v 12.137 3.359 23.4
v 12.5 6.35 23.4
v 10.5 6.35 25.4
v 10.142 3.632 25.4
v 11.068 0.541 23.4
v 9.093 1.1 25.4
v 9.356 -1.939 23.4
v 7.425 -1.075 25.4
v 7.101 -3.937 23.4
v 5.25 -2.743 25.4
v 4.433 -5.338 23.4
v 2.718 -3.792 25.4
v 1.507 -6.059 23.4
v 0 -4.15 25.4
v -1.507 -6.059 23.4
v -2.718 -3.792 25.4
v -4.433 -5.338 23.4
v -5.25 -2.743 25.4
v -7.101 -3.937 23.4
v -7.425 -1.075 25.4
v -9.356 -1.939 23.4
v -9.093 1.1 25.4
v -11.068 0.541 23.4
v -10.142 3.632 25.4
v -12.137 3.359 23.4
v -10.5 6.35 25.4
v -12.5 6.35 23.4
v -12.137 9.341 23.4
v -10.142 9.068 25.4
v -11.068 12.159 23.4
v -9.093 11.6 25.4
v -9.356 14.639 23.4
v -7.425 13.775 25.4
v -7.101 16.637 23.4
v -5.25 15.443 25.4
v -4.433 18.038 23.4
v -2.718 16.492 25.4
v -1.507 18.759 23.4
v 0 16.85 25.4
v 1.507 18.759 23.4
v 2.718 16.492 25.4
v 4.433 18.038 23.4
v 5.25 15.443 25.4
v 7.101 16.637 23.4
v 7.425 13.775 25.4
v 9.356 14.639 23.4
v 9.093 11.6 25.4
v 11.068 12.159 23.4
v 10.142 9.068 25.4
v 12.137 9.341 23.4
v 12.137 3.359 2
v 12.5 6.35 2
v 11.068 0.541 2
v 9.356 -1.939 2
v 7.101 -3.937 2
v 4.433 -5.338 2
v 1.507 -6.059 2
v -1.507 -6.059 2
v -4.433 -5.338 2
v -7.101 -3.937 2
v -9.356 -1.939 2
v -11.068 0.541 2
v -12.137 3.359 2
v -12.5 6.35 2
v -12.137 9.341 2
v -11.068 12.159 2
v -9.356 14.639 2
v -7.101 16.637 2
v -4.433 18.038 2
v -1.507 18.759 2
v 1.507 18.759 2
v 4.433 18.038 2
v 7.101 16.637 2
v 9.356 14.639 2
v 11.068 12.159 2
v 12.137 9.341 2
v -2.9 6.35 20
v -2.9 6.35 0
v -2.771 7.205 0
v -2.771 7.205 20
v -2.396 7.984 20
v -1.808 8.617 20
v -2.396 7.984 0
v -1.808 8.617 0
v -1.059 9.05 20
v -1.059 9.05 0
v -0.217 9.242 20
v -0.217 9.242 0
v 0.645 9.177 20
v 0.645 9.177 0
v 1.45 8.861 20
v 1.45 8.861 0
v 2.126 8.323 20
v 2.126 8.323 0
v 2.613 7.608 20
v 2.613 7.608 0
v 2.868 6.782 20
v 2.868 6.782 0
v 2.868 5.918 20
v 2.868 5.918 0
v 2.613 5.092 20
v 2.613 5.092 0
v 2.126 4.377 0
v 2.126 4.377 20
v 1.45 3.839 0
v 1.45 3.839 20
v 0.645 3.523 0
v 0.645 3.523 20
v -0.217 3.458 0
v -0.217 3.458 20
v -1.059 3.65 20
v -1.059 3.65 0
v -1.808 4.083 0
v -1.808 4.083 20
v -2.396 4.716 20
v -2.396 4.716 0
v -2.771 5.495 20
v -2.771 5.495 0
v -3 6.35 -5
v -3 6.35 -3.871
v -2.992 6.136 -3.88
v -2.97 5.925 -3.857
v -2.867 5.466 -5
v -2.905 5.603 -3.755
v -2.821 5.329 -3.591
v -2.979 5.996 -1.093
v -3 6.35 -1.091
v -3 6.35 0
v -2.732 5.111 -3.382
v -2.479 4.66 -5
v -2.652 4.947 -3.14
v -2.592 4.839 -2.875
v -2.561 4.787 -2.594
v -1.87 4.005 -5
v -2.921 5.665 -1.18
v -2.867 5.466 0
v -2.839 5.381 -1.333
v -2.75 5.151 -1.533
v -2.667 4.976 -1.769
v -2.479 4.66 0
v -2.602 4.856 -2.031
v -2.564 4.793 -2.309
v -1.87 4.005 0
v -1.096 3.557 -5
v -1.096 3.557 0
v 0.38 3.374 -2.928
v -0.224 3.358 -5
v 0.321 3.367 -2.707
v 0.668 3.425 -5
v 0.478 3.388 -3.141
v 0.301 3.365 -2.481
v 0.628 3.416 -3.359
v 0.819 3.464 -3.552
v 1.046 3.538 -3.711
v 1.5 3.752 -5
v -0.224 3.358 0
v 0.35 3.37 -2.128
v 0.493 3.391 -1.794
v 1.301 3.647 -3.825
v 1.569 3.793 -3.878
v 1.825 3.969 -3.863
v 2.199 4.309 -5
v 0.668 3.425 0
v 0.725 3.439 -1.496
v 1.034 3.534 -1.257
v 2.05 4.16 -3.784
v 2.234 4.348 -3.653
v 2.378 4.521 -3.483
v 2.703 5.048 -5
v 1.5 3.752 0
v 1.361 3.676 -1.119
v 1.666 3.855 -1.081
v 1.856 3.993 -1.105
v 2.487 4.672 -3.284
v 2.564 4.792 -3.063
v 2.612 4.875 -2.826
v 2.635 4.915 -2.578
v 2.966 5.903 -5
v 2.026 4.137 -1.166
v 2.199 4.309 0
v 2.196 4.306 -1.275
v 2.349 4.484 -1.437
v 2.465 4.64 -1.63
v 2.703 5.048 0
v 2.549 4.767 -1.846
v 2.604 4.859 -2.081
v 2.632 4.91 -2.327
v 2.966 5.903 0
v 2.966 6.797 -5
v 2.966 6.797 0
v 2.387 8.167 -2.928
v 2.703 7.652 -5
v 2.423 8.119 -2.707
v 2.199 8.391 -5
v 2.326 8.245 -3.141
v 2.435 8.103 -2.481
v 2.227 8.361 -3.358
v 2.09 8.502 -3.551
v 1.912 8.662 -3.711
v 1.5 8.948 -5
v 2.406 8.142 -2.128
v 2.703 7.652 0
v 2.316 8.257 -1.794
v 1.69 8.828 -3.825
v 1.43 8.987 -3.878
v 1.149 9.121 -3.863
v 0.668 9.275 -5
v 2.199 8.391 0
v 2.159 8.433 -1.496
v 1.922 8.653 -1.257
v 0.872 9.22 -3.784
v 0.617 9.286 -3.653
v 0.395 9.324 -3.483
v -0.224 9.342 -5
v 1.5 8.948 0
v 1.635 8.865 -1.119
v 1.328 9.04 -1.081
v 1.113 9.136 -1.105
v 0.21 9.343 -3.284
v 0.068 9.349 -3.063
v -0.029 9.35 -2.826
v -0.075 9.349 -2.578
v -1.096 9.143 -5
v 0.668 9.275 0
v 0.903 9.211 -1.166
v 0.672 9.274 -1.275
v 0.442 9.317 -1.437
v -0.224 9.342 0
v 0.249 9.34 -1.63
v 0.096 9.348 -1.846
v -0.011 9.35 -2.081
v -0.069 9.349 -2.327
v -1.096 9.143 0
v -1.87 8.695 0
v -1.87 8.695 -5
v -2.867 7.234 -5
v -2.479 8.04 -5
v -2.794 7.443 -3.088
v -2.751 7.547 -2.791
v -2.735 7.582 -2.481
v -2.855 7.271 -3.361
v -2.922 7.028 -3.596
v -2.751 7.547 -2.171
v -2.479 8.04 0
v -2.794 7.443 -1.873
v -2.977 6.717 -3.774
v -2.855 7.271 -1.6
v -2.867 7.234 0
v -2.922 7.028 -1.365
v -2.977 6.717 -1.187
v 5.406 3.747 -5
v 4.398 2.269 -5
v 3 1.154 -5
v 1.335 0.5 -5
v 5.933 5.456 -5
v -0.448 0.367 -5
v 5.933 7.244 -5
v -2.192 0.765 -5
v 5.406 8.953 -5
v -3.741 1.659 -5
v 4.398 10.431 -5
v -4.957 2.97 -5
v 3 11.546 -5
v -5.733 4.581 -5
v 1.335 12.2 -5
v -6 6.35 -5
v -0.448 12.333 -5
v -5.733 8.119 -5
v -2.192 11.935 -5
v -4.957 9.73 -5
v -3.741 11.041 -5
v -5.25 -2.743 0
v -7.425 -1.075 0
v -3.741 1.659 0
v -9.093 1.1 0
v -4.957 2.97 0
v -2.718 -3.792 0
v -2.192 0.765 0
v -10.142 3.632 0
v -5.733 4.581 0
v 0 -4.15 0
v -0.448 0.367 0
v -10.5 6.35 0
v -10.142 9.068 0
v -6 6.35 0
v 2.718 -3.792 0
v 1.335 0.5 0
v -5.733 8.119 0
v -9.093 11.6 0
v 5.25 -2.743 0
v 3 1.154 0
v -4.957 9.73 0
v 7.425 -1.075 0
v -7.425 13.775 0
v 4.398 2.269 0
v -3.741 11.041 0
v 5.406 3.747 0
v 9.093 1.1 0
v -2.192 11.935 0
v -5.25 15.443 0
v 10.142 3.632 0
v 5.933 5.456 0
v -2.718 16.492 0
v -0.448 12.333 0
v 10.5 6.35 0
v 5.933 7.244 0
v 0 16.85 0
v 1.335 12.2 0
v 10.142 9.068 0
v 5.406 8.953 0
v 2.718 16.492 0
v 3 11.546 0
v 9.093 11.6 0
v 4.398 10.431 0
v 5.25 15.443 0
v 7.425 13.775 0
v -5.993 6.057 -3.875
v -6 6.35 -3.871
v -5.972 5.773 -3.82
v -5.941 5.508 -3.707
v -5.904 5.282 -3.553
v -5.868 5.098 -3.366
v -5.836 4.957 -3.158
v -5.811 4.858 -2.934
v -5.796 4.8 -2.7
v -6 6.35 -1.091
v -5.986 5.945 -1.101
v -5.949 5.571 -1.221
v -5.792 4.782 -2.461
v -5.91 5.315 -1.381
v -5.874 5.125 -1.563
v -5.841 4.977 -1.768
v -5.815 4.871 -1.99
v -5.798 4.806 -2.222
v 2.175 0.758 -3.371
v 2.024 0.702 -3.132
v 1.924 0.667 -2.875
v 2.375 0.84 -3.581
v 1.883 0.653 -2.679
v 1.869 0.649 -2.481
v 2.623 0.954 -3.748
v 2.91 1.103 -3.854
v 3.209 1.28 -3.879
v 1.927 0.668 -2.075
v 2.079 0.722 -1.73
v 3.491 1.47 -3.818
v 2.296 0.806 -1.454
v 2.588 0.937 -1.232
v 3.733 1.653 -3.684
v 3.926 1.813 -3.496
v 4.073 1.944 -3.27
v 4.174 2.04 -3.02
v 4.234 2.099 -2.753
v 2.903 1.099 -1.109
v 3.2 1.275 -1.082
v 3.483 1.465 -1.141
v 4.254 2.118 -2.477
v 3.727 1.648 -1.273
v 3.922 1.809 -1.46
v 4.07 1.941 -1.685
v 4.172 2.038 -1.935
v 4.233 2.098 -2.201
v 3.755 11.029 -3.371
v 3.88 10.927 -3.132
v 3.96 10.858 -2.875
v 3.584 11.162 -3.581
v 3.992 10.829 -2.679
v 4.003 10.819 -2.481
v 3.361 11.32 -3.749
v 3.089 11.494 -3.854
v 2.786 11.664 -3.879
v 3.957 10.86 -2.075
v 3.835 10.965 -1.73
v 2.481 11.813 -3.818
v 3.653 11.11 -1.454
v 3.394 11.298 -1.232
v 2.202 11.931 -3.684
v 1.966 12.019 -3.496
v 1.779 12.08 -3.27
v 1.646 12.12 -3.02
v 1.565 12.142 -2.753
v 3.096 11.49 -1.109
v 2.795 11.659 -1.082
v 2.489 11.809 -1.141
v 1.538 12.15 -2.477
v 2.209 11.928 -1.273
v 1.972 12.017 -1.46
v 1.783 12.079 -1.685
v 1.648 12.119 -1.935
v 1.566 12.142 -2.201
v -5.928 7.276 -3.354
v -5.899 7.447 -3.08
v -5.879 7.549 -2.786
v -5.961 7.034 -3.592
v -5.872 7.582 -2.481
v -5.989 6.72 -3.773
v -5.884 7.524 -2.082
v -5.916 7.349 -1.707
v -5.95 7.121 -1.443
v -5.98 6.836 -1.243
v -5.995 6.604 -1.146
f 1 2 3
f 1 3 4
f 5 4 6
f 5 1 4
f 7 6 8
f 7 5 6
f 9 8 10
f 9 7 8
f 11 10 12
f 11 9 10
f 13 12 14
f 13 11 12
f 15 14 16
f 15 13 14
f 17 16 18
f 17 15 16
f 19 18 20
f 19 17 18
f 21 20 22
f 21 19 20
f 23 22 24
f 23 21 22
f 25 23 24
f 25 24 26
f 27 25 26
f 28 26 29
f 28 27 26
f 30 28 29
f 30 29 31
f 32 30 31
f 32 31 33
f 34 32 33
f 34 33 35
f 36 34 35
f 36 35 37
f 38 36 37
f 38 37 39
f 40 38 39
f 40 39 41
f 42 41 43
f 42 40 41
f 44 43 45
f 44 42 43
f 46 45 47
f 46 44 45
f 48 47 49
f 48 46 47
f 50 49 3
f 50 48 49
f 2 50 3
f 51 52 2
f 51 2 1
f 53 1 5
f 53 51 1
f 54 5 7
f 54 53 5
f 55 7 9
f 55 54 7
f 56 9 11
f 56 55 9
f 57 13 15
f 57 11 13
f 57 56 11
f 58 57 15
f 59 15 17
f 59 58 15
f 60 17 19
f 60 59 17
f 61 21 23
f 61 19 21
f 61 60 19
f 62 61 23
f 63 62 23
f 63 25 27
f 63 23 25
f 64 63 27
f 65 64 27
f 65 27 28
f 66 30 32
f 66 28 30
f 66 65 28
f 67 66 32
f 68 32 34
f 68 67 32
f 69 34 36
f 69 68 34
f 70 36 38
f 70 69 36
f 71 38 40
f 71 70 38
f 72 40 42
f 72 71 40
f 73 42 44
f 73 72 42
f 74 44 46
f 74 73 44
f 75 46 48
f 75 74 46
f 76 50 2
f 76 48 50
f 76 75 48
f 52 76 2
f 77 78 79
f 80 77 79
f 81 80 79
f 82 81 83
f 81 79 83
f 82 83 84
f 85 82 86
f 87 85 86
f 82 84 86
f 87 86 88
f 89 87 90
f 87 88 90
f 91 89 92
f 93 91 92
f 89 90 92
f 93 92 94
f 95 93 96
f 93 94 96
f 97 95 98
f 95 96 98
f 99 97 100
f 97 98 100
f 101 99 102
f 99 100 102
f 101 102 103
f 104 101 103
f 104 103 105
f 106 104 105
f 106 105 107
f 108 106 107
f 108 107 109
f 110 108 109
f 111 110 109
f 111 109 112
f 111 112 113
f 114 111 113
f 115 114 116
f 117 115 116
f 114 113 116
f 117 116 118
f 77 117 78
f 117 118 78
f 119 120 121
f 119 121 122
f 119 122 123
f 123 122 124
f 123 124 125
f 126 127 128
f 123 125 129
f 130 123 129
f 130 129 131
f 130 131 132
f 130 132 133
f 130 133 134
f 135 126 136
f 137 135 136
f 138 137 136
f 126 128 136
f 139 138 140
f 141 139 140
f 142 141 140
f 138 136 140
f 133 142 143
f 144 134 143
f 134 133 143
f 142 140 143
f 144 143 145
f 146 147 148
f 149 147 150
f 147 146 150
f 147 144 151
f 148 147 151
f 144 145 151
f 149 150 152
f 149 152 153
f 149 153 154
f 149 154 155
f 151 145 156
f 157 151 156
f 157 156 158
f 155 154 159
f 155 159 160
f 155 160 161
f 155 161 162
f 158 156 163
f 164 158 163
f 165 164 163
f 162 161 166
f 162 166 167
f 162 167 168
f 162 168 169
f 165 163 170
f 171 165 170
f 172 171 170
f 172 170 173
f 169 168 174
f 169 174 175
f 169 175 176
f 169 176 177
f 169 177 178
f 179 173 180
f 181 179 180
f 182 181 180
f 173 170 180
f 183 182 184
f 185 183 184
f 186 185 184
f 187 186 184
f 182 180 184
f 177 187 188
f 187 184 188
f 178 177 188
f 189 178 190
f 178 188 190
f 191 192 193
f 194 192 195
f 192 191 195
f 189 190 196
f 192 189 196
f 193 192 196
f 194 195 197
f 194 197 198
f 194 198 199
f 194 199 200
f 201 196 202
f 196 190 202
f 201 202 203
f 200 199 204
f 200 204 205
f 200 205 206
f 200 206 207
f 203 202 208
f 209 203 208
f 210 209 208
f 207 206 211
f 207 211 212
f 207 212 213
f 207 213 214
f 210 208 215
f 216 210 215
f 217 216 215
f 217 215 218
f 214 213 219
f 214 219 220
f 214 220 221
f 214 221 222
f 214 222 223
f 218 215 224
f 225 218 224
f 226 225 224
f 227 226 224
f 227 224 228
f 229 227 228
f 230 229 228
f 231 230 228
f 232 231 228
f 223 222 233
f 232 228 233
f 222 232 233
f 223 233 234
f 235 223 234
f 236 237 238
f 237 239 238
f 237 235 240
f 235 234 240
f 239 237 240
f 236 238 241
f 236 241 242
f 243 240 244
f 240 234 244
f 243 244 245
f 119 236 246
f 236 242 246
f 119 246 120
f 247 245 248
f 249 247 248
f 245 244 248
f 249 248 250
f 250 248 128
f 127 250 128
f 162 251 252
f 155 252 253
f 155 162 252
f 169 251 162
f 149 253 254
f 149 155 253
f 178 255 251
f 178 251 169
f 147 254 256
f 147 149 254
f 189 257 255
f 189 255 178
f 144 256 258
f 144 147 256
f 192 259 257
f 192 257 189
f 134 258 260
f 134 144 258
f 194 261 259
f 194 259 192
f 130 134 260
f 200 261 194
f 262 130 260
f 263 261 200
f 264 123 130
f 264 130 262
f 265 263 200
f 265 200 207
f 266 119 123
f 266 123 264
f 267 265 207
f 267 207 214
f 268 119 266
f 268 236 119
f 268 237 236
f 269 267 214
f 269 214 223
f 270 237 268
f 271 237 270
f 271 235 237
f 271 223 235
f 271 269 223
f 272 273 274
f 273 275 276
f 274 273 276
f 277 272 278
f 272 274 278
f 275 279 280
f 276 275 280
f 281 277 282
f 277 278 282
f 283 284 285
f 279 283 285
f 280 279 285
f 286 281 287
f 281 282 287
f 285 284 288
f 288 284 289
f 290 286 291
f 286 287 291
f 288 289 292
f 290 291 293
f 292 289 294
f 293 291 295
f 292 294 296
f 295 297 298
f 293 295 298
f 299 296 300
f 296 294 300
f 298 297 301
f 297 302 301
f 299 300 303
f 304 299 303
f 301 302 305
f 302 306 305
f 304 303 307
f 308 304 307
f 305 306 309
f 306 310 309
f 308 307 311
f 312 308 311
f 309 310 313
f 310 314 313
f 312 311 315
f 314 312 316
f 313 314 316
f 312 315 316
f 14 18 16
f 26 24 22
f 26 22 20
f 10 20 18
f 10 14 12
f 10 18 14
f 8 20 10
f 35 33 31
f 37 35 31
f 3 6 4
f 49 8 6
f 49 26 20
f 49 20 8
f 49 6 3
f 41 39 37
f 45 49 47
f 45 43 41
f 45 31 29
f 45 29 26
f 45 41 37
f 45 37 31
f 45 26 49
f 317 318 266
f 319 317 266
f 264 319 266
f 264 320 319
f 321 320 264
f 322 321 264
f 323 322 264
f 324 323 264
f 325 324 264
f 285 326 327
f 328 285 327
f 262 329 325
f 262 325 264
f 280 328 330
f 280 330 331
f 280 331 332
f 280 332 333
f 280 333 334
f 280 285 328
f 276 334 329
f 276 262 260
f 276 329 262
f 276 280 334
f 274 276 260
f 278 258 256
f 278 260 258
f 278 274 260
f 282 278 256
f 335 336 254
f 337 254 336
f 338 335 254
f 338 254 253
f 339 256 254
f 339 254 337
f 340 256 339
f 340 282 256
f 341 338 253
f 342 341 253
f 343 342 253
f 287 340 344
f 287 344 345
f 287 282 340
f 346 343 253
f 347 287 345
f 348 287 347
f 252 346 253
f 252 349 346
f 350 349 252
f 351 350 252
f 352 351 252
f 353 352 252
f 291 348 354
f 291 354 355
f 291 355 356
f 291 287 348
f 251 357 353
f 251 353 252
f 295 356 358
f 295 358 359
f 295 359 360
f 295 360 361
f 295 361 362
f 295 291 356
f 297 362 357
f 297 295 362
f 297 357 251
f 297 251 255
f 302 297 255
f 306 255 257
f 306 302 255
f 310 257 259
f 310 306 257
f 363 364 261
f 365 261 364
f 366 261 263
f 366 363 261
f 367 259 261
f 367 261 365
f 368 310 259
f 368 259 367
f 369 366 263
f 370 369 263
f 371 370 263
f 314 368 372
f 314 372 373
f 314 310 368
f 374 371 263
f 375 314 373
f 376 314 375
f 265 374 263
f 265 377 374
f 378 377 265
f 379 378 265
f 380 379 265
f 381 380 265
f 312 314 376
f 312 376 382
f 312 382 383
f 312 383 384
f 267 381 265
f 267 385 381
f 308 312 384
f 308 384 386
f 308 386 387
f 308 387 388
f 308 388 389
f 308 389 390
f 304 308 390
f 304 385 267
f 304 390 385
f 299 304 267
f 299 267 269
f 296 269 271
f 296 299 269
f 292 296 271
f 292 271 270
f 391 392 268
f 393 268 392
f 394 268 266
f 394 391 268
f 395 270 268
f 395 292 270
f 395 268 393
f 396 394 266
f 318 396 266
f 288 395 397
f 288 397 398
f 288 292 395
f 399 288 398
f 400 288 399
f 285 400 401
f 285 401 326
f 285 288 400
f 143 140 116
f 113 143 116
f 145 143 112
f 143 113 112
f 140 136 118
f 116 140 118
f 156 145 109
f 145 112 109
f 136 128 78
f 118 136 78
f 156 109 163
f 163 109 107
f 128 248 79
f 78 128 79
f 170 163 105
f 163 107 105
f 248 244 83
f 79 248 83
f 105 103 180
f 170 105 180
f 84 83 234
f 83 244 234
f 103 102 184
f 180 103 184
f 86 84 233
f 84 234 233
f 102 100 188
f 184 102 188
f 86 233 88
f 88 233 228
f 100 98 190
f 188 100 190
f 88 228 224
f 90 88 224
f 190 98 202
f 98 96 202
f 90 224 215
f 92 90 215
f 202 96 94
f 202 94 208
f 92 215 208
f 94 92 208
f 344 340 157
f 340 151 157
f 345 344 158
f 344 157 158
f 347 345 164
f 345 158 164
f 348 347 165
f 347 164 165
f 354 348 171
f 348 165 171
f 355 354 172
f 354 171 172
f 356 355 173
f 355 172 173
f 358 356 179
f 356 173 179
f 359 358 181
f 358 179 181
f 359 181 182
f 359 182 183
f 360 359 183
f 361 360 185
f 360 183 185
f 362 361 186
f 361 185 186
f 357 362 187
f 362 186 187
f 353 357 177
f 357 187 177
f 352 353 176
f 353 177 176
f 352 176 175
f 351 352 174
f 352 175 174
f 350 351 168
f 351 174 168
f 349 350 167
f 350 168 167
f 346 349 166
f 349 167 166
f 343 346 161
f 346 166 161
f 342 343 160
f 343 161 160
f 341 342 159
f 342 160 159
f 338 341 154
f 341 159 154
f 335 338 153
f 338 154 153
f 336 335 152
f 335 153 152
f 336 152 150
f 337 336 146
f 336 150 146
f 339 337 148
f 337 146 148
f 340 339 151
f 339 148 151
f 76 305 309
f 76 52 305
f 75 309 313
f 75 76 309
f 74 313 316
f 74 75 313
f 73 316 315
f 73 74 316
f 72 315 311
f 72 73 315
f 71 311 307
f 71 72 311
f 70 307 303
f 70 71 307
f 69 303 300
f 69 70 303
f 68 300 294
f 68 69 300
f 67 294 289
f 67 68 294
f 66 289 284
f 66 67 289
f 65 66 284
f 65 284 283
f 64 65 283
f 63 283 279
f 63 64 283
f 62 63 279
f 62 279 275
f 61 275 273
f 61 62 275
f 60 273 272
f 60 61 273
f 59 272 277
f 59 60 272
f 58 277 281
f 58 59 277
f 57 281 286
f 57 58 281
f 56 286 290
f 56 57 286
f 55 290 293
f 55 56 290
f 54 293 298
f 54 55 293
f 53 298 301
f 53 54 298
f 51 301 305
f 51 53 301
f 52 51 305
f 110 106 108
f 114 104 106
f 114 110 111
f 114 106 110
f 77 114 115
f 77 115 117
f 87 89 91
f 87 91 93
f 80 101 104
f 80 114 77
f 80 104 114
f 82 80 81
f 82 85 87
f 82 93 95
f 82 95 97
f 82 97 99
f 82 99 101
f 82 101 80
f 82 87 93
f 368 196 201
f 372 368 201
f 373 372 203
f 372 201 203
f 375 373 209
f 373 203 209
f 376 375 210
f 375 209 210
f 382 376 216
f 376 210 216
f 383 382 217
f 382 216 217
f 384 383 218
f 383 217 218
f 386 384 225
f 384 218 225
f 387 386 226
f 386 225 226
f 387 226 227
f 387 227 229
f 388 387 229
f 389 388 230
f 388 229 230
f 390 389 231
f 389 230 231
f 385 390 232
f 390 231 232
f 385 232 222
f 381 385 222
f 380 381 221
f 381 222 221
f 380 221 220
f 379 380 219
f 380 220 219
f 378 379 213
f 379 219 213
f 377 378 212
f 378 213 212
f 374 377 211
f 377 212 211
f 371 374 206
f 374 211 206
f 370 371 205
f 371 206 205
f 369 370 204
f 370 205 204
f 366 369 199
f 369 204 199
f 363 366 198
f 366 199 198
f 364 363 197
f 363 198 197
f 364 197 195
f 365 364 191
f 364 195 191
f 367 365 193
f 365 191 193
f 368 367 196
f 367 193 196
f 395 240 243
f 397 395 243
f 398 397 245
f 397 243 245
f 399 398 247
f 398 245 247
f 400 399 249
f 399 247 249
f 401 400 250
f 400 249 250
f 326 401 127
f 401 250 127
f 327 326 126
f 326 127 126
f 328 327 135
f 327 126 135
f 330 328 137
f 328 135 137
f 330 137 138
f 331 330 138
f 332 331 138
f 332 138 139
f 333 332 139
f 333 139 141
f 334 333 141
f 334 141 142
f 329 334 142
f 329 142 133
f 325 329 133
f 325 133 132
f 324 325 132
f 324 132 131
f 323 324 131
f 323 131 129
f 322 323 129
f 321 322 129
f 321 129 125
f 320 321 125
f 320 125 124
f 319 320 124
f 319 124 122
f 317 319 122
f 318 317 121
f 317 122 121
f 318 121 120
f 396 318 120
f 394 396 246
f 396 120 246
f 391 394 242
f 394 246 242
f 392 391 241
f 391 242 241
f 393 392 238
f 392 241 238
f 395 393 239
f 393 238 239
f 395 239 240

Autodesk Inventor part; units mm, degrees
ref_plane "YZ Plane" through (0, 0, 0) normal (1, 0, 0) x (0, 1, 0)
ref_plane "XZ Plane" through (0, 0, 0) normal (0, 1, 0) x (-1, 0, 0)
ref_plane "XY Plane" through (0, 0, 0) normal (0, 0, 1) x (1, 0, 0)
ref_plane "Work Plane1" through (0, 0, 0) normal (0, 0, 1) x (1, 0, 0)
sketch "Sketch1" plane through (0, 0, 0) normal (0, 0, 1) x (1, 0, 0)
  circle A0 centre (0, 6.35) radius 4 projected
  circle A1 centre (0, 6.35) radius 12.5
  point P0 (0, 0)
  dimension "d0" = 25
extrude "Extrusion1" add sketch "Sketch1" along normal blind 25.4 contours A0 | A1
sketch "Skizze2" plane through (0, 6.35, 0) normal (0, 0, -1) x (-1, 0, 0)
  circle A0 centre (0, 0) radius 11 projected
  circle A1 centre (0, 0) radius 2.9
  point P0 (0, -6.35)
  point P1 (-5.9, 11.95)
  dimension "d3" = 5.8
extrude "Extrusion2" cut sketch "Skizze2" against normal blind 20 contours A1
chamfer "Fase1" distance 2 angle 45 2 edges at (-12.5, 6.35, 25.4) (-12.5, 6.35, 0)
sketch "Skizze3" plane through (0, 6.35, 0) normal (0, 0, -1) x (-1, 0, 0)
  circle A0 centre (0, 0) radius 3 projected
  circle A1 centre (0, 0) radius 2.9 projected
  circle A2 centre (0, 0) radius 10.5 projected
  circle A3 centre (0, 0) radius 6
  point P0 (0, -6.35)
  dimension "d9" = 12
extrude "Extrusion3" add sketch "Skizze3" along normal blind 5 contours A3
sketch "Skizze4" plane through (0, 0, 0) normal (1, 0, 0) x (0, 1, 0)
  circle A0 centre (6.1822, -2.4807) radius 1.4
  point P0 (0, 0)
  dimension "d12" = 2.8
extrude "Extrusion4" cut sketch "Skizze4" against normal through all
pattern_circular "Runde Anordnung1" count 3 over 360 about axis through (0, 6.35, 0) along (0, 0, -1) of "Extrusion4"
properties part number "ManualKnob"
